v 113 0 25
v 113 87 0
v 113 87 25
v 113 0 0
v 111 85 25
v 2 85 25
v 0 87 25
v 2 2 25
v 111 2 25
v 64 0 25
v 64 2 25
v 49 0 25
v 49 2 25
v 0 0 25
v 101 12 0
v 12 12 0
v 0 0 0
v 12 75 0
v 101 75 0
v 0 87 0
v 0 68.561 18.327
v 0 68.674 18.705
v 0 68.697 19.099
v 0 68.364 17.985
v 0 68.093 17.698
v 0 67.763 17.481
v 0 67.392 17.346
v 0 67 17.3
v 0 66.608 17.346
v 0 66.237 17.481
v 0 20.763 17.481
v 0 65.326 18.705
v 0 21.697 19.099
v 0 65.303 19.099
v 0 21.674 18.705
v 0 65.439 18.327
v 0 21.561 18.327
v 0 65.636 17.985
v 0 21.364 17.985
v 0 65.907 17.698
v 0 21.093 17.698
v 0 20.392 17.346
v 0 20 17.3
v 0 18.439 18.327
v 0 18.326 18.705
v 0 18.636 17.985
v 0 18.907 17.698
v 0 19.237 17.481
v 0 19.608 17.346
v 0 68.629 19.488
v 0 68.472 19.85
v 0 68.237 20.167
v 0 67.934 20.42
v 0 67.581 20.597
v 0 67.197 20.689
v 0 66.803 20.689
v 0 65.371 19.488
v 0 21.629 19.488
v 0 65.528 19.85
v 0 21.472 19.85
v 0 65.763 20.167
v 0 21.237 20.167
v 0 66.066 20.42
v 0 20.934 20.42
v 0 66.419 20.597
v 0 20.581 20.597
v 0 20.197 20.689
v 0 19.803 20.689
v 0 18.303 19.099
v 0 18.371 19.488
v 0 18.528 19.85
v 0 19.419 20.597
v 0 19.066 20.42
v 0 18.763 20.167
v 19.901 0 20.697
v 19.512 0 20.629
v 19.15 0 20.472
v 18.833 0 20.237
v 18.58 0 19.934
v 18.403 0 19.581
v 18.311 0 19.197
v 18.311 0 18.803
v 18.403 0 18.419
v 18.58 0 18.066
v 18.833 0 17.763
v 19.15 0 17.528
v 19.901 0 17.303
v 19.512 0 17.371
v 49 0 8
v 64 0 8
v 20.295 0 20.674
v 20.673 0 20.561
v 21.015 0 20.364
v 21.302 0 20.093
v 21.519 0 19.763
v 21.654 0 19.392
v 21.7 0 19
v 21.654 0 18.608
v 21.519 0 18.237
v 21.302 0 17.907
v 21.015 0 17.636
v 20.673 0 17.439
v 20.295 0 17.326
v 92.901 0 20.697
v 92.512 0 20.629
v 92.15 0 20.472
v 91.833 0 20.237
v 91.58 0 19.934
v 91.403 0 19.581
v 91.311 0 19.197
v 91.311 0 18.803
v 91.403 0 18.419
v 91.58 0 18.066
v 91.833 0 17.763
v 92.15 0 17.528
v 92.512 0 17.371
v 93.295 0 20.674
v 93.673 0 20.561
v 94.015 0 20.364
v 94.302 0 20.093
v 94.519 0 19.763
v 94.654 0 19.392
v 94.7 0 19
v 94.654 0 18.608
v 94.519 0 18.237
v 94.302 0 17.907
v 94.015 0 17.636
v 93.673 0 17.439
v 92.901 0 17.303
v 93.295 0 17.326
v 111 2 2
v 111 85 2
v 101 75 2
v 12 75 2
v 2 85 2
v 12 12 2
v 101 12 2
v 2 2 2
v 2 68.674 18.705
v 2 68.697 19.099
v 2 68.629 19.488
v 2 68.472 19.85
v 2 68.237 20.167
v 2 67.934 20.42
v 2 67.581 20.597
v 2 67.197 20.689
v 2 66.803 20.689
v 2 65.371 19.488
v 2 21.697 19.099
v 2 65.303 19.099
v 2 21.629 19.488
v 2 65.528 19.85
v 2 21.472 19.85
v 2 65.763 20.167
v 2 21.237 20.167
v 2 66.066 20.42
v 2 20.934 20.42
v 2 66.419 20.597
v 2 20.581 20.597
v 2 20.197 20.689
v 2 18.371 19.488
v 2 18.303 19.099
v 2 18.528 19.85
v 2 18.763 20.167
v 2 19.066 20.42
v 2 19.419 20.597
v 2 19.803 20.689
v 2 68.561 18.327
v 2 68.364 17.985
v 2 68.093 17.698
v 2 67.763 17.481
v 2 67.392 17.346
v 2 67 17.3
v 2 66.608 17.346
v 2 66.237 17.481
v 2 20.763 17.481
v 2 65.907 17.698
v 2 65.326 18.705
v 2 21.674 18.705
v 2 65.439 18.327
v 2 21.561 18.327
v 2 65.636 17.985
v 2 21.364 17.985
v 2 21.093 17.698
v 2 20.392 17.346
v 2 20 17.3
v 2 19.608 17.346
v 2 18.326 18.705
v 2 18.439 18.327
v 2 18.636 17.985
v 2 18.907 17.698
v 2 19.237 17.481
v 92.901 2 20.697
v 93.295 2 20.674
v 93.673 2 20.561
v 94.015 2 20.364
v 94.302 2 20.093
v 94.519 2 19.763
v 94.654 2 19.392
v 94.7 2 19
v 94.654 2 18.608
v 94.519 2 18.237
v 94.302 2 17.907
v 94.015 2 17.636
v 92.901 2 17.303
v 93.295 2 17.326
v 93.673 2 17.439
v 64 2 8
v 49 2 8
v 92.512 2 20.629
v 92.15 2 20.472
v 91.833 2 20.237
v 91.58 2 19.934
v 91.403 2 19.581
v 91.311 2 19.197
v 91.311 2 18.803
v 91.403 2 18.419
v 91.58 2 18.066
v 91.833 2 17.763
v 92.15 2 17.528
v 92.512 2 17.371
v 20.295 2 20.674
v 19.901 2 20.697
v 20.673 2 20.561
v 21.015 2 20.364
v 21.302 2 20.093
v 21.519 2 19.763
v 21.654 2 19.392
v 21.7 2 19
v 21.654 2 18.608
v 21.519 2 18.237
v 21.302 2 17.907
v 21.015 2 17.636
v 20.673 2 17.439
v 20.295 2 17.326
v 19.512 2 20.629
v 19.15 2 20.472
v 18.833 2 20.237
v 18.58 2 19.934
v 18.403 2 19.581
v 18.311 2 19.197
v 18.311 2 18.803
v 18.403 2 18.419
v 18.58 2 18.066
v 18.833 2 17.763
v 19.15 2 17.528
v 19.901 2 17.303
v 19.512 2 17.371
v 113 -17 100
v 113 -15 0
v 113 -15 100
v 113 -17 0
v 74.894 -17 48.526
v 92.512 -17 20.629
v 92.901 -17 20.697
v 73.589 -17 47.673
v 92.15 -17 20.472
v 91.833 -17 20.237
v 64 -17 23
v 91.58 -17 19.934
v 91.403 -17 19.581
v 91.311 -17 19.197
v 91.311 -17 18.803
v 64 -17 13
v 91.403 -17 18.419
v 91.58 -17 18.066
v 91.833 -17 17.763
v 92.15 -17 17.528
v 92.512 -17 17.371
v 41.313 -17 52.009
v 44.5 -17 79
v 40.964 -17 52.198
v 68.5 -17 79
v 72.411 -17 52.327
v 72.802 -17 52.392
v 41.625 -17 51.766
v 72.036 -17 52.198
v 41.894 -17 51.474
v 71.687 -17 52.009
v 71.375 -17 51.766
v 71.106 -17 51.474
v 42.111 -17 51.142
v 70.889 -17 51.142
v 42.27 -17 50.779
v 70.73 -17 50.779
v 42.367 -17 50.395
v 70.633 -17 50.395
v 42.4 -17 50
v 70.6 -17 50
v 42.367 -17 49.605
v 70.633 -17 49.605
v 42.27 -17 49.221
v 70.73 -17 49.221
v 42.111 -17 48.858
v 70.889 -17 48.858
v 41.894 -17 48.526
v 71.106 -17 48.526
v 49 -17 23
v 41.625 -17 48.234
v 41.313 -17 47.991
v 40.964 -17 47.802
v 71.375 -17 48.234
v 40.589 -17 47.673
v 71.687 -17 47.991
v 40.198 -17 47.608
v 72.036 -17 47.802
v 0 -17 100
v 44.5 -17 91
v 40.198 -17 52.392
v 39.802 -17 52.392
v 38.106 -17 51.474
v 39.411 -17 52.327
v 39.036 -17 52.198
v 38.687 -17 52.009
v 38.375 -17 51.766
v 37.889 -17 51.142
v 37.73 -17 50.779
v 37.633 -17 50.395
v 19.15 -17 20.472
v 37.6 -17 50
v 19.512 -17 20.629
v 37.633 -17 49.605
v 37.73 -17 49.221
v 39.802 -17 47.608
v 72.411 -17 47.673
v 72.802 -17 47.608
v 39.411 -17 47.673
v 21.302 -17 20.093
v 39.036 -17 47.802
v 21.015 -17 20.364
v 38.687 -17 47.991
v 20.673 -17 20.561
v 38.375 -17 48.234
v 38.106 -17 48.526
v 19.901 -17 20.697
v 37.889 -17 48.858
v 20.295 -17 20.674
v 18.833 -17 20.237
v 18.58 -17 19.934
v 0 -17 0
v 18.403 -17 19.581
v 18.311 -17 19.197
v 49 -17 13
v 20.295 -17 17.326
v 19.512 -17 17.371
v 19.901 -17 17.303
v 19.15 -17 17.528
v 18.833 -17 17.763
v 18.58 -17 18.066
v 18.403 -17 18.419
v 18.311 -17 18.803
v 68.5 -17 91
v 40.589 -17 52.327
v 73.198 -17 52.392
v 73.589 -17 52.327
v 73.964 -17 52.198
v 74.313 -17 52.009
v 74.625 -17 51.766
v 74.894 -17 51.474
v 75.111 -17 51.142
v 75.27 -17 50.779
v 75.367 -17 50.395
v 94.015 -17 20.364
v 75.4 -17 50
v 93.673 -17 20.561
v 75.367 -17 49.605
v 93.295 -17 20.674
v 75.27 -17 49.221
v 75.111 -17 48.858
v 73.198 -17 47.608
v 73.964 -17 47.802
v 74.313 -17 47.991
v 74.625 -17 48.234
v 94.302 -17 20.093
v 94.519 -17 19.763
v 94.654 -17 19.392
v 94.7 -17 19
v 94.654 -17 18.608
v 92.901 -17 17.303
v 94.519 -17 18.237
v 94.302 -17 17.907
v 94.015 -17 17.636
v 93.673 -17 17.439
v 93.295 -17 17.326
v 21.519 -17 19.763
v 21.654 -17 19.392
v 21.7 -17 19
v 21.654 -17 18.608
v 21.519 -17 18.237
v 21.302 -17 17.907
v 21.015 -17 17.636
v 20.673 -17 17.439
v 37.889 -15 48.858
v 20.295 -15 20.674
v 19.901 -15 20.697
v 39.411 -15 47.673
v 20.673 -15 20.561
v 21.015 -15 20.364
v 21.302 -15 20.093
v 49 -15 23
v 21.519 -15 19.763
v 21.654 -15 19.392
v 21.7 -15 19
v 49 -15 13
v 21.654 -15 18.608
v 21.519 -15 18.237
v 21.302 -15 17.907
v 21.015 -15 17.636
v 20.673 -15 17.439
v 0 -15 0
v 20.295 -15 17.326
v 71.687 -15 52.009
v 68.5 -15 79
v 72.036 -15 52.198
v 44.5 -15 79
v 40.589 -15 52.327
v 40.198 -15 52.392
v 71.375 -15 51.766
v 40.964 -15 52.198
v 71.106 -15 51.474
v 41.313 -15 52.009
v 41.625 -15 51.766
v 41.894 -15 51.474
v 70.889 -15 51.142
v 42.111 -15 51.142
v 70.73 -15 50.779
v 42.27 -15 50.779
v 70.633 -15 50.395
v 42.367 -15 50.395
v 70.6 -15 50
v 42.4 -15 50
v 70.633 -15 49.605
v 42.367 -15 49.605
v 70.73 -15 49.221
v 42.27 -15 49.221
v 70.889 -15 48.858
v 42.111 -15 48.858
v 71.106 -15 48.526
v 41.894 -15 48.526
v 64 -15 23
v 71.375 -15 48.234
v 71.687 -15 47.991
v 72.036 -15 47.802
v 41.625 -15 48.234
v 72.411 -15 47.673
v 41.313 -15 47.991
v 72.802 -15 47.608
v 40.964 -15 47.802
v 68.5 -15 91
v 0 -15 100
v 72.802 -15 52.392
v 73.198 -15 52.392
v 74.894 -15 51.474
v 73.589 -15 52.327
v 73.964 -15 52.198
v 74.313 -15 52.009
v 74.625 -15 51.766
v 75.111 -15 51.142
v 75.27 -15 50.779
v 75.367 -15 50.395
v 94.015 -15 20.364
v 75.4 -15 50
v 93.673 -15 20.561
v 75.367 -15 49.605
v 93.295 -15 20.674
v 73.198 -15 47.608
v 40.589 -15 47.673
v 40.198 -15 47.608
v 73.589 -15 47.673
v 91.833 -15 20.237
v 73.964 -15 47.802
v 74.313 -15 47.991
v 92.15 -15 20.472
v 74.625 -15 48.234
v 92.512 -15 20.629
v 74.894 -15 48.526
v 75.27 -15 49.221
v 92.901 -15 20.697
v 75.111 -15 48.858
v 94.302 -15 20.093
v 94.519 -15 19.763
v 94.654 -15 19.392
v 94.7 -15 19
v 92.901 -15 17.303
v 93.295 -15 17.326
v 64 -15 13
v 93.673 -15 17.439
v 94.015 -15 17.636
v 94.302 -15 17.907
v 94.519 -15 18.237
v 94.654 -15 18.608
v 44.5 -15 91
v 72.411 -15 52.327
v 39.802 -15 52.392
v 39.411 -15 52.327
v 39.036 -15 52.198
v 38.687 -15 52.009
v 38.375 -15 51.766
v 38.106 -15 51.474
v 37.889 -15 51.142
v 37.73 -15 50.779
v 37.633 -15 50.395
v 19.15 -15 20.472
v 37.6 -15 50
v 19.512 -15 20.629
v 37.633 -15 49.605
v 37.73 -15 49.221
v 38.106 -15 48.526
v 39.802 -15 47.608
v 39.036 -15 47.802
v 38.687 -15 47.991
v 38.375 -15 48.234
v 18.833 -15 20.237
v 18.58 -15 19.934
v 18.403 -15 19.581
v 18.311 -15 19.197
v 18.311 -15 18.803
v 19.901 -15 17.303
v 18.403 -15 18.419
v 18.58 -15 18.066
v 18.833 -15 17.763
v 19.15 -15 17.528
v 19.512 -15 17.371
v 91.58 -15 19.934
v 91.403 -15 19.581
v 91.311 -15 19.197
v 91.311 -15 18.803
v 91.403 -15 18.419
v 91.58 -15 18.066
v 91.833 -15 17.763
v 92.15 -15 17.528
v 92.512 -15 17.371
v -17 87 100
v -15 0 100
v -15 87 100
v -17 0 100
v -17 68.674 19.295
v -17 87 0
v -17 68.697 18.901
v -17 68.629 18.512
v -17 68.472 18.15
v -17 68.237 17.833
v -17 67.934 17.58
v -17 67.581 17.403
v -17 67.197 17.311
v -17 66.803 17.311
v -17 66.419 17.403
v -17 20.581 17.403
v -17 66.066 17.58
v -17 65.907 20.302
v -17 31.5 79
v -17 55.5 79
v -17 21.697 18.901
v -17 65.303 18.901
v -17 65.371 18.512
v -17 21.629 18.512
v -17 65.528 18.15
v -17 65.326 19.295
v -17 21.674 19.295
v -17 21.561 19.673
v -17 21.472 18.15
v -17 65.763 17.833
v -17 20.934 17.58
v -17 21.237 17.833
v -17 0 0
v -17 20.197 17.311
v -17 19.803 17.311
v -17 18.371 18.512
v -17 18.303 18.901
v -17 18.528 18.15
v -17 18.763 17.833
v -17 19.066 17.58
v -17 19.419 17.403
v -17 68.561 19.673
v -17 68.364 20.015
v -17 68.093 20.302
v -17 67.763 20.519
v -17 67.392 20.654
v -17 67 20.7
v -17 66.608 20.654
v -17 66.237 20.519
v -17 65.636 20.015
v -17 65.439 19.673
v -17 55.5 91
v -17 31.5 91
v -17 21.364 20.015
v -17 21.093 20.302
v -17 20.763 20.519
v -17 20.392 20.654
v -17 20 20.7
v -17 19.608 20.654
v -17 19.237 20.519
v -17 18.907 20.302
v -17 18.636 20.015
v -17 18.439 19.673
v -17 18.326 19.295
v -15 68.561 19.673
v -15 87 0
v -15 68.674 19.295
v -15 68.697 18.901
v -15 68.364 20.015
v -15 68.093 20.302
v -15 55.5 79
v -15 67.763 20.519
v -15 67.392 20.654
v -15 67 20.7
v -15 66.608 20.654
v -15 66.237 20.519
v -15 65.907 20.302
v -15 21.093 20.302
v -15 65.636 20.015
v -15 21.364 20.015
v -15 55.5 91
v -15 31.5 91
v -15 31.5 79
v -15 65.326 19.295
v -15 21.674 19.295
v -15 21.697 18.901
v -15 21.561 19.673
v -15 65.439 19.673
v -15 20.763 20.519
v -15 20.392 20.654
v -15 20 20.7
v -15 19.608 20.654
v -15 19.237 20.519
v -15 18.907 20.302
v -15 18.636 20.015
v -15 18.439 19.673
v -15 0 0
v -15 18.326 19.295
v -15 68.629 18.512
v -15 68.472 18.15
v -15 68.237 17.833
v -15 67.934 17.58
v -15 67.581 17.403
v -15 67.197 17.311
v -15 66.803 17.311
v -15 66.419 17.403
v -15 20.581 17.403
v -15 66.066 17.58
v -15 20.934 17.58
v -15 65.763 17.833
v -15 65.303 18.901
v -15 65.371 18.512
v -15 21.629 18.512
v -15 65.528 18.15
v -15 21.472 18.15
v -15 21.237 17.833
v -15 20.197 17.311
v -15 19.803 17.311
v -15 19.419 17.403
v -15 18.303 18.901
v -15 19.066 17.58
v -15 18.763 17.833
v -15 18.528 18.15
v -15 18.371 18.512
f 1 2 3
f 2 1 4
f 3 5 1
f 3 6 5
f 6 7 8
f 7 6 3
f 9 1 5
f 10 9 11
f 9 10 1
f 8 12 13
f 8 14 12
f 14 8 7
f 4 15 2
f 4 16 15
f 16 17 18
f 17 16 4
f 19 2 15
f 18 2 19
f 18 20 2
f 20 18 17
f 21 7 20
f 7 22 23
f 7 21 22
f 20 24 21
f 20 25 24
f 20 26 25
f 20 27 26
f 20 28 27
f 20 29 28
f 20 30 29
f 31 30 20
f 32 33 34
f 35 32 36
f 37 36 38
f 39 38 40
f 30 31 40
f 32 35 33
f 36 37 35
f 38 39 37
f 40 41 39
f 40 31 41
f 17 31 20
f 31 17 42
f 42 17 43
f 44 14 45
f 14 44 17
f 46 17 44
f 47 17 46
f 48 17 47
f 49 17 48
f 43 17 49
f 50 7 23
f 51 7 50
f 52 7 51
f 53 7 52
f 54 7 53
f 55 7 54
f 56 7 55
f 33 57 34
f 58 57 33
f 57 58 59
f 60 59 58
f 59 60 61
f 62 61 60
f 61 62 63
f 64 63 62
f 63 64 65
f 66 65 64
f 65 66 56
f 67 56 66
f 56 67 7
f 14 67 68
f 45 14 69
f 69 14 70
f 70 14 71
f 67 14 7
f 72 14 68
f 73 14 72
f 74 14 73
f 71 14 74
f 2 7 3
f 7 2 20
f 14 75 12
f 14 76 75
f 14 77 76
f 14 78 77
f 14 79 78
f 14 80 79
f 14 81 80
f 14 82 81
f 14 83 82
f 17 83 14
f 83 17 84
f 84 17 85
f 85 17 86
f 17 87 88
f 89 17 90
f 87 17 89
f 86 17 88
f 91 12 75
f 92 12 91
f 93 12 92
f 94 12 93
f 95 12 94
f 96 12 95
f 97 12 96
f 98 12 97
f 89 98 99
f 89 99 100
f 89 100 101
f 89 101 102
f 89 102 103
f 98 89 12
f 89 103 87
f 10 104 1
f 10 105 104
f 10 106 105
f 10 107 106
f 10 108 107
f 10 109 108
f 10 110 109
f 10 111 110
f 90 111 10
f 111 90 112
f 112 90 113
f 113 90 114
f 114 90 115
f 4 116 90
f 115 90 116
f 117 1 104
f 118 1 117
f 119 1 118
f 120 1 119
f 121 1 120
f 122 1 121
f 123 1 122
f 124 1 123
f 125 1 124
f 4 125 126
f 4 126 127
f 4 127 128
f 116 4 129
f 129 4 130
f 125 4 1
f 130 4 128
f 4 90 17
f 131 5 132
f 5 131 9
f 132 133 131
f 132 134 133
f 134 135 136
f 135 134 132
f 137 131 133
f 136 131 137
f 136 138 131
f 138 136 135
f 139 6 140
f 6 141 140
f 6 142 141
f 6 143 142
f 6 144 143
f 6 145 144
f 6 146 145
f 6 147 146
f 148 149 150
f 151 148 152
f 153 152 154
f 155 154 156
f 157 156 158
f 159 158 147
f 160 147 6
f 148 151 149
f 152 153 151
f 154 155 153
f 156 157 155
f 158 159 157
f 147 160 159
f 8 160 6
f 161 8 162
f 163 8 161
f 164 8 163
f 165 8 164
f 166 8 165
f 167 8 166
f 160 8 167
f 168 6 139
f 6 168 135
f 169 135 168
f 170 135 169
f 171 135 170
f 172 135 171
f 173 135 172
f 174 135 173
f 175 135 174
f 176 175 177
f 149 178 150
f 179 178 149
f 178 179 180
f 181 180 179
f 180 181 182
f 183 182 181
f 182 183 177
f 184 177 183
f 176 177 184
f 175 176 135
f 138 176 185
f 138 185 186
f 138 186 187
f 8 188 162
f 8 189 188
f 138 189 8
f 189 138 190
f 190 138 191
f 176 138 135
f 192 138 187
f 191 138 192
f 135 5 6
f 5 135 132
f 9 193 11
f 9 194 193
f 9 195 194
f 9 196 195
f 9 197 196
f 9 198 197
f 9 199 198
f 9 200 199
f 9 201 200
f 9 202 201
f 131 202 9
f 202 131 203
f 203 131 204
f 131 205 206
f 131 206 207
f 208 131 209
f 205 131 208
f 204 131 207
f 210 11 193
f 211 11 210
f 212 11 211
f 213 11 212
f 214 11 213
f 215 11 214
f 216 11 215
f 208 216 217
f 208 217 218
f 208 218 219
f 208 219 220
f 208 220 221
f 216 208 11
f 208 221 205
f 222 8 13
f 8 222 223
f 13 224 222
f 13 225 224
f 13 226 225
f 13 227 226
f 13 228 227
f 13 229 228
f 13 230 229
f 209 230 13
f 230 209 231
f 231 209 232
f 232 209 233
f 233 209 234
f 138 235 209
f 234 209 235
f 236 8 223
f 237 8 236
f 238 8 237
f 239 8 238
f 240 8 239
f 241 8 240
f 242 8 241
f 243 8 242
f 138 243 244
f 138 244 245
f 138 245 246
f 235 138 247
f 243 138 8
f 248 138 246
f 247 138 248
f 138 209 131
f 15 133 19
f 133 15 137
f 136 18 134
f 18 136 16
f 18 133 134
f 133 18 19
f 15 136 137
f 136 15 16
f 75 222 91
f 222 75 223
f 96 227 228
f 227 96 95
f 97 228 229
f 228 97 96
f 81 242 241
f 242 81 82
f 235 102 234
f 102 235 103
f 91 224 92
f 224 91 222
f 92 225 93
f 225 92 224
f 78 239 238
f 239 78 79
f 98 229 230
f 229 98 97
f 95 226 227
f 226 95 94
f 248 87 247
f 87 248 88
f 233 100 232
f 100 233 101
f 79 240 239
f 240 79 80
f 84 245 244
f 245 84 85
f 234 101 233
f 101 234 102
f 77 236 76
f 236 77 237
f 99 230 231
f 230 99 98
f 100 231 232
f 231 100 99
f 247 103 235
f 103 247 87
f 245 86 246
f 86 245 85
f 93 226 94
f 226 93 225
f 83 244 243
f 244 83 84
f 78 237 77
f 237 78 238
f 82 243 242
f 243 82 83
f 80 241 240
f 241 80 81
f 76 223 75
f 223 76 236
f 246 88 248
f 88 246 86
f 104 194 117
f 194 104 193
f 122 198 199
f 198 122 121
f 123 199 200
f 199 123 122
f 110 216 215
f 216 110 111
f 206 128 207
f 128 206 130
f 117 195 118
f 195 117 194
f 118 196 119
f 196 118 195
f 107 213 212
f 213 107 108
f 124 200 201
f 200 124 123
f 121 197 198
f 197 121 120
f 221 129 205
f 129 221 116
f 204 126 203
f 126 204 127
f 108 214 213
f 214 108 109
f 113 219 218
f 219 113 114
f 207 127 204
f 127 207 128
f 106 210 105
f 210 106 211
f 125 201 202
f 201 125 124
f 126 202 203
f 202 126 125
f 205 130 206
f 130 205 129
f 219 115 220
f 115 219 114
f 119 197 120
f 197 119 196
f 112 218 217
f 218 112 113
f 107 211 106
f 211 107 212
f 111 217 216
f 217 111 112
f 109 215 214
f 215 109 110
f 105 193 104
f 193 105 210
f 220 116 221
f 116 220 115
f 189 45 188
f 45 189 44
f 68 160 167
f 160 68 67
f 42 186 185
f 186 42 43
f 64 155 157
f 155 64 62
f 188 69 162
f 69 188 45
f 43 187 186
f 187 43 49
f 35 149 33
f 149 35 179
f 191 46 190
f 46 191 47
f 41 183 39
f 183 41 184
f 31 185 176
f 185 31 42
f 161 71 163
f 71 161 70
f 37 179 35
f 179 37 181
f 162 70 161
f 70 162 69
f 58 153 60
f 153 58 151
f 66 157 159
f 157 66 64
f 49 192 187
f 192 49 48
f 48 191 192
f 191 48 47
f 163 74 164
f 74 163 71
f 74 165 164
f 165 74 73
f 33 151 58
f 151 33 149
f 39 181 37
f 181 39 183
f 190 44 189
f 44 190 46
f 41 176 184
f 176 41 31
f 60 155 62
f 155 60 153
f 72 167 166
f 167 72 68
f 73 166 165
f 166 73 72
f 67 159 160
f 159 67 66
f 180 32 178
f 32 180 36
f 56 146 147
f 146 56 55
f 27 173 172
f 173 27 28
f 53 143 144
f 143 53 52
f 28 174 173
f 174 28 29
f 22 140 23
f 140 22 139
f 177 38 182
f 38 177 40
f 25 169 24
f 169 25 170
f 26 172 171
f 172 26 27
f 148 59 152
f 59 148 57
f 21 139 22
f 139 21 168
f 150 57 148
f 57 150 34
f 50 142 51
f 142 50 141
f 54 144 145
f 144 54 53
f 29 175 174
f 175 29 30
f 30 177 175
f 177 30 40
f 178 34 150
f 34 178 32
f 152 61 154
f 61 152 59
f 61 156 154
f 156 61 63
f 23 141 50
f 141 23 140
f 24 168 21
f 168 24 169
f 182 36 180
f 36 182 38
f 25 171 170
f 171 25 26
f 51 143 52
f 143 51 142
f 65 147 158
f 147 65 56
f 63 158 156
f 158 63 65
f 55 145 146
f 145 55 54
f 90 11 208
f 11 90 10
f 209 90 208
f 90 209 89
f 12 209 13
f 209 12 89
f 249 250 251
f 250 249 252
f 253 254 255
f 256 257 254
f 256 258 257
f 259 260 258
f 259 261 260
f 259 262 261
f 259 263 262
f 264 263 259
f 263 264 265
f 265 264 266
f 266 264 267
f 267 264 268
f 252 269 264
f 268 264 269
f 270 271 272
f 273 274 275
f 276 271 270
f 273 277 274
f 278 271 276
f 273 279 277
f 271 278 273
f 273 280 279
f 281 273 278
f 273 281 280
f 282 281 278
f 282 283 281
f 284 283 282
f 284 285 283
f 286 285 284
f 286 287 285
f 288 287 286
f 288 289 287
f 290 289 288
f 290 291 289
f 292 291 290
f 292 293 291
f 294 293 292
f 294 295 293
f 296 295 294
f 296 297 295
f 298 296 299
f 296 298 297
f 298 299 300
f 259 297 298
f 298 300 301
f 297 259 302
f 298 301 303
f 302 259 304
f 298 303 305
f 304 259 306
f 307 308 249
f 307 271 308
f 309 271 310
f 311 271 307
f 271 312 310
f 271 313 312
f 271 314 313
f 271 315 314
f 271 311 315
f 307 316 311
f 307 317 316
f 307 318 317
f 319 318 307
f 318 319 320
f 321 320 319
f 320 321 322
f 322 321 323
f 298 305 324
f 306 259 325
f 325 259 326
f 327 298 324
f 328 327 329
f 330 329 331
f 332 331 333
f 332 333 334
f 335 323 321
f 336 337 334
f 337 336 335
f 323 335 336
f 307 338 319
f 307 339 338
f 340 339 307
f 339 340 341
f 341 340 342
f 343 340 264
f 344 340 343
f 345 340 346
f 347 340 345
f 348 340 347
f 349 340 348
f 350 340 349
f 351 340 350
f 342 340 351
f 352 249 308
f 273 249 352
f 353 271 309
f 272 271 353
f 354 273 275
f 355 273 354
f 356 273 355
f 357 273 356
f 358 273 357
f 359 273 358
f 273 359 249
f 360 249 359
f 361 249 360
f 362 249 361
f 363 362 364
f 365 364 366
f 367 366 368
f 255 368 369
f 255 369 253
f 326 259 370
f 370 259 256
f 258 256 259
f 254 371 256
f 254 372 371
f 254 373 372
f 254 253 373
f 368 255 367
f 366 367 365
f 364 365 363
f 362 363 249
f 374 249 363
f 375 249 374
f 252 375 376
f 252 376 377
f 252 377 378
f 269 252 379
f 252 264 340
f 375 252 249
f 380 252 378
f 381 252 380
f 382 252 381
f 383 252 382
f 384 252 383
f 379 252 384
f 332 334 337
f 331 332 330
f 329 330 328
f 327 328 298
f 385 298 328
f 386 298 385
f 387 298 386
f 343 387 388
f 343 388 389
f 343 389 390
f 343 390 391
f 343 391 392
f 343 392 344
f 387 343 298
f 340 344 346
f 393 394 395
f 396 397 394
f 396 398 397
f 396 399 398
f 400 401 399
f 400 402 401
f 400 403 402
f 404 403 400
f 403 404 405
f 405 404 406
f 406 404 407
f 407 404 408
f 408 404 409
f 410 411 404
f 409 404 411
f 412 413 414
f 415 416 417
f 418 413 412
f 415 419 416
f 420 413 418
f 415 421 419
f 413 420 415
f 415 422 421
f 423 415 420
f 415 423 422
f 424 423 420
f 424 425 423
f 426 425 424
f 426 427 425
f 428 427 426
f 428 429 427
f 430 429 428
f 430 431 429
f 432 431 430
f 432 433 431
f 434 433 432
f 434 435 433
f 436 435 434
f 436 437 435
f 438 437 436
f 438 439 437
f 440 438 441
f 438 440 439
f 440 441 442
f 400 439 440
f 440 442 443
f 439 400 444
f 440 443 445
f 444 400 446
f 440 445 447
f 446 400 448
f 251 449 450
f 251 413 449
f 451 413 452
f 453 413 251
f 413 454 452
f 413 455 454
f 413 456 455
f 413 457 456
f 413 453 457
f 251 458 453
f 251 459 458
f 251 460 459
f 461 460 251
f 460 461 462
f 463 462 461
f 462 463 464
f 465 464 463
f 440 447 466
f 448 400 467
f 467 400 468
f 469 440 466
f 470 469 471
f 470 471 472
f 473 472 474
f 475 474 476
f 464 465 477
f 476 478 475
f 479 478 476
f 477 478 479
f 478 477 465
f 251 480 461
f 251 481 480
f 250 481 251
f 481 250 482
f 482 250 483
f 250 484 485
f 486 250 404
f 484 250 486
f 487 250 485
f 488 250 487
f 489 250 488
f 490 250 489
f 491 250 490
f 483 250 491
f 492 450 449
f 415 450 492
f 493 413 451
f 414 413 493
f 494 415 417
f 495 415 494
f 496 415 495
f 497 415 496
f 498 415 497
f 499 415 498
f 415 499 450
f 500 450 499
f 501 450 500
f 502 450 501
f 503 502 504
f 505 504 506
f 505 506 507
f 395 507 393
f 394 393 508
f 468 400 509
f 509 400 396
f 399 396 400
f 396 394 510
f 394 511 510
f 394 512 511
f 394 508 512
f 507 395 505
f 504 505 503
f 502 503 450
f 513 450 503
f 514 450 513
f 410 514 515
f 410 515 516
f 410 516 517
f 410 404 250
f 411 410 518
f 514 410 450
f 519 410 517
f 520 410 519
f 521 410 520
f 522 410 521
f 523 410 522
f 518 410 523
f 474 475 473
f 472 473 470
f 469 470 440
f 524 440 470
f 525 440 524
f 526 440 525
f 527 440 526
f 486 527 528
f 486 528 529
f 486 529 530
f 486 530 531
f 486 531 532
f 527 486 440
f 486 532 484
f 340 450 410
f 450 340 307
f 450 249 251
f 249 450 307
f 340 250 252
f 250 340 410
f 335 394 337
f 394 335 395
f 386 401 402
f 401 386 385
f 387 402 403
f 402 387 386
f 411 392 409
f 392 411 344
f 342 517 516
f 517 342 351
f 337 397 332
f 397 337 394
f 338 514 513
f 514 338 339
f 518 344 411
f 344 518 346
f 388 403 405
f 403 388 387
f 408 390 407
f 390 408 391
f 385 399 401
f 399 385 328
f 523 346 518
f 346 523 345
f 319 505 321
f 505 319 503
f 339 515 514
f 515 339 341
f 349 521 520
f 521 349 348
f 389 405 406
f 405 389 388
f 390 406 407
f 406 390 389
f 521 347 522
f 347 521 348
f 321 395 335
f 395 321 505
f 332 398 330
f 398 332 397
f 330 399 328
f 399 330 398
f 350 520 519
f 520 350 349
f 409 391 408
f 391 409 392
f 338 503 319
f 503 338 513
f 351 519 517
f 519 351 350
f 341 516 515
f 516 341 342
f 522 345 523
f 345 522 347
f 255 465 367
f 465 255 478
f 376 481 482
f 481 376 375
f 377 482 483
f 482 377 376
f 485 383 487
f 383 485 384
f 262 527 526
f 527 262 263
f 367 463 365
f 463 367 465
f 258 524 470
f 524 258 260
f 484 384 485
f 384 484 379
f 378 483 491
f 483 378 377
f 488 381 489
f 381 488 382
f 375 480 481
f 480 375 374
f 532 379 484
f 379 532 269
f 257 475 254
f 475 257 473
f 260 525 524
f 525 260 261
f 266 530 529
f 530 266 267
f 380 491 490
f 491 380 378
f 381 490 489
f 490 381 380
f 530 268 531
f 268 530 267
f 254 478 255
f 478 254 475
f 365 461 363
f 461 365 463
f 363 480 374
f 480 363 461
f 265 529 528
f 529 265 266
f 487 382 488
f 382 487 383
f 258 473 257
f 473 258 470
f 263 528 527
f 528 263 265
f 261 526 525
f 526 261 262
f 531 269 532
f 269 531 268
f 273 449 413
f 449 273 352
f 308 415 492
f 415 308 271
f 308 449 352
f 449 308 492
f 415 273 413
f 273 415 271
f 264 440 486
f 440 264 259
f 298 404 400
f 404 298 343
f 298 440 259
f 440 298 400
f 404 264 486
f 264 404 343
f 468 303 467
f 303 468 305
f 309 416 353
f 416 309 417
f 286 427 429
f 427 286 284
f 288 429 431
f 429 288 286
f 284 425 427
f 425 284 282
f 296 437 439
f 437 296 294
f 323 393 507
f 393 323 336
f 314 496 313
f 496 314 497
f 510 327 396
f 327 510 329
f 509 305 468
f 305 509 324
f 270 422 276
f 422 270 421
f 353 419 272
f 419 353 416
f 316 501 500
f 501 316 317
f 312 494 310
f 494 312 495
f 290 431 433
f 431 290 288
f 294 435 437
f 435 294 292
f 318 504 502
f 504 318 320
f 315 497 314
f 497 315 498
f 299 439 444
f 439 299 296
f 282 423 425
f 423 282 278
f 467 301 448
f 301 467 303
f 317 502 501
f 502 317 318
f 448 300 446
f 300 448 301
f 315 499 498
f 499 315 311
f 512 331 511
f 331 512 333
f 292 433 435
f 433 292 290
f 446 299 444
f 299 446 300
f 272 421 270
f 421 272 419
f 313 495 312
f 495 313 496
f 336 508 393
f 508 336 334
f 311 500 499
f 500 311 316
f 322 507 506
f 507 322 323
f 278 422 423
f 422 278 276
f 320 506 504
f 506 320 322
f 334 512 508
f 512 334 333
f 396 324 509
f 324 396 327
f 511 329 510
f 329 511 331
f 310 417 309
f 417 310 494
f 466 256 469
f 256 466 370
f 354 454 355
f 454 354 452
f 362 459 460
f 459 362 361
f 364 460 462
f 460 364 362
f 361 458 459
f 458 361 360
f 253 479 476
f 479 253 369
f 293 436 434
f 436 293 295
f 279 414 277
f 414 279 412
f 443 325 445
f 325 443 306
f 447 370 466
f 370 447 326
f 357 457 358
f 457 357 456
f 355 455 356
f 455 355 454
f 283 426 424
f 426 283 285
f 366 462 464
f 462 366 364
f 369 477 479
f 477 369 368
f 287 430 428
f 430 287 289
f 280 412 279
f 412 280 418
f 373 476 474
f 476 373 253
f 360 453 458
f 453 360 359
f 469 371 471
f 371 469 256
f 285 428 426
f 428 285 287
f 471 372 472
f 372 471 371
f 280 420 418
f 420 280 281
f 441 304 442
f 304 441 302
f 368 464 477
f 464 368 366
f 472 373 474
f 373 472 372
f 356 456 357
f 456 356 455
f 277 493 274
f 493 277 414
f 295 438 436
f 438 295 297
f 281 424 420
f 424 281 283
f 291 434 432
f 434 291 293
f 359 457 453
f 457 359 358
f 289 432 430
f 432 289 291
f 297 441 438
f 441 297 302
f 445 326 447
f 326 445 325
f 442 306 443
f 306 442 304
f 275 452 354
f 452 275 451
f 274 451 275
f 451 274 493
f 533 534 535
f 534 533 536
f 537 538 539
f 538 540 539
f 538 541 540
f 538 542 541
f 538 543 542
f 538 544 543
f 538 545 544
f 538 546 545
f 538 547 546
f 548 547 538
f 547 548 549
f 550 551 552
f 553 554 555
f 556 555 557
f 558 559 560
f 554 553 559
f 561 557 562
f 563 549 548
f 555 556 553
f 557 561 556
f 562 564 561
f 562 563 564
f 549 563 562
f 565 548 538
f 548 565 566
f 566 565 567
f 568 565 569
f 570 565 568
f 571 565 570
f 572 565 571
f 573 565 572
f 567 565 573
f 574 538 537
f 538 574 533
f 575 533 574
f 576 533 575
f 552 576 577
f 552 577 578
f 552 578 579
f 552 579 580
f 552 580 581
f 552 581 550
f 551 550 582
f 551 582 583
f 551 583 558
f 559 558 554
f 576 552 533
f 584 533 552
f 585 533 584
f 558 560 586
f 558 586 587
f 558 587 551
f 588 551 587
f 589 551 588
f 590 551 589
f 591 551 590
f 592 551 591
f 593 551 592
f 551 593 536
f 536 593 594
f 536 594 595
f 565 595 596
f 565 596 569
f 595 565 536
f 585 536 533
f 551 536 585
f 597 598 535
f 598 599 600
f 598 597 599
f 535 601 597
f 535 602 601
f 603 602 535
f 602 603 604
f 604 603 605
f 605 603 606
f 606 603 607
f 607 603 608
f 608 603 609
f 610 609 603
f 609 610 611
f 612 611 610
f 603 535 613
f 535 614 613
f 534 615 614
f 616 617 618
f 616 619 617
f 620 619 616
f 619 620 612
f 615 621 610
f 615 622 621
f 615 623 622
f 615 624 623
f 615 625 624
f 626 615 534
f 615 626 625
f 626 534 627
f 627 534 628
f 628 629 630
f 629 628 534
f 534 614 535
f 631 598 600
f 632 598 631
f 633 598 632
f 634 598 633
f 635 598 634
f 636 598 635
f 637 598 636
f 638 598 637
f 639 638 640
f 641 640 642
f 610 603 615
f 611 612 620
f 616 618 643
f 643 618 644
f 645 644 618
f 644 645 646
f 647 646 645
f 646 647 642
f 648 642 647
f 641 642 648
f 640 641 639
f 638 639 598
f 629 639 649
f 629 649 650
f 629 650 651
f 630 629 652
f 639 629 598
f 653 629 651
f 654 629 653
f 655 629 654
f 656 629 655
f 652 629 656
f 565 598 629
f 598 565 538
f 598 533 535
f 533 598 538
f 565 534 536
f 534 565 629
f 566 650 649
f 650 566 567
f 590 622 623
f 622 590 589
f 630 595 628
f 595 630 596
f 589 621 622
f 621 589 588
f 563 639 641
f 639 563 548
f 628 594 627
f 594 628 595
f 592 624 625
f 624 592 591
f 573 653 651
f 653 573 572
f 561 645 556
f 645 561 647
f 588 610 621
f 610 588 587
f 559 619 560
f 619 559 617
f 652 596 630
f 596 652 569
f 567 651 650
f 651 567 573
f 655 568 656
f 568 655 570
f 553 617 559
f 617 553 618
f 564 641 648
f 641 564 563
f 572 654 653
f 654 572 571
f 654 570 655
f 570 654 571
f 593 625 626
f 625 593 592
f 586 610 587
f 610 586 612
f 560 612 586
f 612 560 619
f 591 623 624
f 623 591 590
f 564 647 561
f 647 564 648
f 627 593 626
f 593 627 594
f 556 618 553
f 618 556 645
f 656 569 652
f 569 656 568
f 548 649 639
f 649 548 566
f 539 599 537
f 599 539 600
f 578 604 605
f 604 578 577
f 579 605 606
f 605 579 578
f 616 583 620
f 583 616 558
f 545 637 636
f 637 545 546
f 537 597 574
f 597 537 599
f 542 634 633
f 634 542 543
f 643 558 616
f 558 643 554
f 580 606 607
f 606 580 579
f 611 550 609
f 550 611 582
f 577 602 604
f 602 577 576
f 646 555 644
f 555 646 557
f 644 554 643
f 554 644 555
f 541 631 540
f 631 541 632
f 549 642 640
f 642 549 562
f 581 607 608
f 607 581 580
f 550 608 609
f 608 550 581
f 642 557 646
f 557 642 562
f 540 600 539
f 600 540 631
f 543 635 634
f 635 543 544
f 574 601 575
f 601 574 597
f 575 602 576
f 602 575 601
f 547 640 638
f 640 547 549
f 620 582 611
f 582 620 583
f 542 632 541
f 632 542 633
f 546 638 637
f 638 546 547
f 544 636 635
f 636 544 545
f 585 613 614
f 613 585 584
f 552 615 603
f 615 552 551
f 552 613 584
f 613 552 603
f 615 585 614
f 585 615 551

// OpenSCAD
// file: servos_case.scad
$fa = 1;
$fs = 0.4;


thickness = 2;
inner_margin = 10;
holes_radius = 1.7;

inner_base_x = 109;
inner_base_y = 83;
inner_base_z = 25;

panels_height = 100;

window_horiz_size = 24;
window_vert_size = 12;

usb_hole_width = 15;
usb_hole_height = 10;
usb_hole_z_offset = 18;

led_hole_radius = 2.4;


module base() {
    difference() {
        
        cube([inner_base_x+thickness*2, inner_base_y+thickness*2, inner_base_z]);
        
        translate([thickness, thickness, thickness])
            cube([inner_base_x, inner_base_y, inner_base_z]);  
        
        translate([thickness+inner_margin, thickness+inner_margin, -0.01])
            cube([inner_base_x-2*inner_margin, inner_base_y-2*inner_margin, inner_base_z]);
        
        translate([20, thickness/2, inner_base_z-6])
            rotate([90, 0, 0])
                cylinder(h=thickness+0.01, r=holes_radius, center=true);
        
        translate([inner_base_x+thickness*2-20, thickness/2, inner_base_z-6])
            rotate([90, 0, 0])
                cylinder(h=thickness+0.01, r=holes_radius, center=true);
        
        translate([thickness/2, 20, inner_base_z-6])
            rotate([0, 90, 0])
                cylinder(h=thickness+0.01, r=holes_radius, center=true);
        
        translate([thickness/2, inner_base_y+thickness*2-20, inner_base_z-6])
            rotate([0, 90, 0])
                cylinder(h=thickness+0.01, r=holes_radius, center=true);        
        
        translate([inner_base_x/2+thickness, thickness/2, usb_hole_z_offset]) {
            cube([usb_hole_width, thickness+0.01, 2*usb_hole_height], center=true);
        }
    }
}


module front_panel() {
    difference() {
        
        cube([inner_base_x+thickness*2, panels_height, thickness]);
        
        translate([20, inner_base_z-6, thickness/2])
            cylinder(h=thickness+0.01, r=holes_radius, center=true);
        
        translate([inner_base_x+thickness*2-20, inner_base_z-6, thickness/2])
            cylinder(h=thickness+0.01, r=holes_radius, center=true);
        
        translate([inner_base_x/2+thickness, panels_height-15, thickness/2])
            cube([window_horiz_size, window_vert_size, thickness+0.01], center=true);        
        
        translate([inner_base_x/2+thickness, usb_hole_z_offset, thickness/2])
            cube([usb_hole_width, usb_hole_height, thickness+0.01], center=true);
                
        translate([40, 2*inner_base_z, thickness/2])
            cylinder(h=thickness+0.01, r=led_hole_radius, center=true);
                
        translate([inner_base_x+thickness*2-40, 2*inner_base_z, thickness/2])
            cylinder(h=thickness+0.01, r=led_hole_radius, center=true);
        
    }
}


module side_panel() {
    difference() {
        
        cube([panels_height, inner_base_y+thickness*2, thickness]);
        
        translate([inner_base_z-6, 20, thickness/2])
            cylinder(h=thickness+0.01, r=holes_radius, center=true);
        
        translate([inner_base_z-6, inner_base_y+thickness*2-20, thickness/2])
            cylinder(h=thickness+0.01, r=holes_radius, center=true);
        
        translate([panels_height-15, inner_base_y/2+thickness, thickness/2])
            cube([window_vert_size, window_horiz_size, thickness+0.01], center=true);
    }
}
// main file
use <servos_case.scad>


base();

translate([0, -15, 0])
    rotate([90, 0, 0])
        front_panel();

translate([-15, 0, 0])
    rotate([0, -90, 0])
        side_panel();
